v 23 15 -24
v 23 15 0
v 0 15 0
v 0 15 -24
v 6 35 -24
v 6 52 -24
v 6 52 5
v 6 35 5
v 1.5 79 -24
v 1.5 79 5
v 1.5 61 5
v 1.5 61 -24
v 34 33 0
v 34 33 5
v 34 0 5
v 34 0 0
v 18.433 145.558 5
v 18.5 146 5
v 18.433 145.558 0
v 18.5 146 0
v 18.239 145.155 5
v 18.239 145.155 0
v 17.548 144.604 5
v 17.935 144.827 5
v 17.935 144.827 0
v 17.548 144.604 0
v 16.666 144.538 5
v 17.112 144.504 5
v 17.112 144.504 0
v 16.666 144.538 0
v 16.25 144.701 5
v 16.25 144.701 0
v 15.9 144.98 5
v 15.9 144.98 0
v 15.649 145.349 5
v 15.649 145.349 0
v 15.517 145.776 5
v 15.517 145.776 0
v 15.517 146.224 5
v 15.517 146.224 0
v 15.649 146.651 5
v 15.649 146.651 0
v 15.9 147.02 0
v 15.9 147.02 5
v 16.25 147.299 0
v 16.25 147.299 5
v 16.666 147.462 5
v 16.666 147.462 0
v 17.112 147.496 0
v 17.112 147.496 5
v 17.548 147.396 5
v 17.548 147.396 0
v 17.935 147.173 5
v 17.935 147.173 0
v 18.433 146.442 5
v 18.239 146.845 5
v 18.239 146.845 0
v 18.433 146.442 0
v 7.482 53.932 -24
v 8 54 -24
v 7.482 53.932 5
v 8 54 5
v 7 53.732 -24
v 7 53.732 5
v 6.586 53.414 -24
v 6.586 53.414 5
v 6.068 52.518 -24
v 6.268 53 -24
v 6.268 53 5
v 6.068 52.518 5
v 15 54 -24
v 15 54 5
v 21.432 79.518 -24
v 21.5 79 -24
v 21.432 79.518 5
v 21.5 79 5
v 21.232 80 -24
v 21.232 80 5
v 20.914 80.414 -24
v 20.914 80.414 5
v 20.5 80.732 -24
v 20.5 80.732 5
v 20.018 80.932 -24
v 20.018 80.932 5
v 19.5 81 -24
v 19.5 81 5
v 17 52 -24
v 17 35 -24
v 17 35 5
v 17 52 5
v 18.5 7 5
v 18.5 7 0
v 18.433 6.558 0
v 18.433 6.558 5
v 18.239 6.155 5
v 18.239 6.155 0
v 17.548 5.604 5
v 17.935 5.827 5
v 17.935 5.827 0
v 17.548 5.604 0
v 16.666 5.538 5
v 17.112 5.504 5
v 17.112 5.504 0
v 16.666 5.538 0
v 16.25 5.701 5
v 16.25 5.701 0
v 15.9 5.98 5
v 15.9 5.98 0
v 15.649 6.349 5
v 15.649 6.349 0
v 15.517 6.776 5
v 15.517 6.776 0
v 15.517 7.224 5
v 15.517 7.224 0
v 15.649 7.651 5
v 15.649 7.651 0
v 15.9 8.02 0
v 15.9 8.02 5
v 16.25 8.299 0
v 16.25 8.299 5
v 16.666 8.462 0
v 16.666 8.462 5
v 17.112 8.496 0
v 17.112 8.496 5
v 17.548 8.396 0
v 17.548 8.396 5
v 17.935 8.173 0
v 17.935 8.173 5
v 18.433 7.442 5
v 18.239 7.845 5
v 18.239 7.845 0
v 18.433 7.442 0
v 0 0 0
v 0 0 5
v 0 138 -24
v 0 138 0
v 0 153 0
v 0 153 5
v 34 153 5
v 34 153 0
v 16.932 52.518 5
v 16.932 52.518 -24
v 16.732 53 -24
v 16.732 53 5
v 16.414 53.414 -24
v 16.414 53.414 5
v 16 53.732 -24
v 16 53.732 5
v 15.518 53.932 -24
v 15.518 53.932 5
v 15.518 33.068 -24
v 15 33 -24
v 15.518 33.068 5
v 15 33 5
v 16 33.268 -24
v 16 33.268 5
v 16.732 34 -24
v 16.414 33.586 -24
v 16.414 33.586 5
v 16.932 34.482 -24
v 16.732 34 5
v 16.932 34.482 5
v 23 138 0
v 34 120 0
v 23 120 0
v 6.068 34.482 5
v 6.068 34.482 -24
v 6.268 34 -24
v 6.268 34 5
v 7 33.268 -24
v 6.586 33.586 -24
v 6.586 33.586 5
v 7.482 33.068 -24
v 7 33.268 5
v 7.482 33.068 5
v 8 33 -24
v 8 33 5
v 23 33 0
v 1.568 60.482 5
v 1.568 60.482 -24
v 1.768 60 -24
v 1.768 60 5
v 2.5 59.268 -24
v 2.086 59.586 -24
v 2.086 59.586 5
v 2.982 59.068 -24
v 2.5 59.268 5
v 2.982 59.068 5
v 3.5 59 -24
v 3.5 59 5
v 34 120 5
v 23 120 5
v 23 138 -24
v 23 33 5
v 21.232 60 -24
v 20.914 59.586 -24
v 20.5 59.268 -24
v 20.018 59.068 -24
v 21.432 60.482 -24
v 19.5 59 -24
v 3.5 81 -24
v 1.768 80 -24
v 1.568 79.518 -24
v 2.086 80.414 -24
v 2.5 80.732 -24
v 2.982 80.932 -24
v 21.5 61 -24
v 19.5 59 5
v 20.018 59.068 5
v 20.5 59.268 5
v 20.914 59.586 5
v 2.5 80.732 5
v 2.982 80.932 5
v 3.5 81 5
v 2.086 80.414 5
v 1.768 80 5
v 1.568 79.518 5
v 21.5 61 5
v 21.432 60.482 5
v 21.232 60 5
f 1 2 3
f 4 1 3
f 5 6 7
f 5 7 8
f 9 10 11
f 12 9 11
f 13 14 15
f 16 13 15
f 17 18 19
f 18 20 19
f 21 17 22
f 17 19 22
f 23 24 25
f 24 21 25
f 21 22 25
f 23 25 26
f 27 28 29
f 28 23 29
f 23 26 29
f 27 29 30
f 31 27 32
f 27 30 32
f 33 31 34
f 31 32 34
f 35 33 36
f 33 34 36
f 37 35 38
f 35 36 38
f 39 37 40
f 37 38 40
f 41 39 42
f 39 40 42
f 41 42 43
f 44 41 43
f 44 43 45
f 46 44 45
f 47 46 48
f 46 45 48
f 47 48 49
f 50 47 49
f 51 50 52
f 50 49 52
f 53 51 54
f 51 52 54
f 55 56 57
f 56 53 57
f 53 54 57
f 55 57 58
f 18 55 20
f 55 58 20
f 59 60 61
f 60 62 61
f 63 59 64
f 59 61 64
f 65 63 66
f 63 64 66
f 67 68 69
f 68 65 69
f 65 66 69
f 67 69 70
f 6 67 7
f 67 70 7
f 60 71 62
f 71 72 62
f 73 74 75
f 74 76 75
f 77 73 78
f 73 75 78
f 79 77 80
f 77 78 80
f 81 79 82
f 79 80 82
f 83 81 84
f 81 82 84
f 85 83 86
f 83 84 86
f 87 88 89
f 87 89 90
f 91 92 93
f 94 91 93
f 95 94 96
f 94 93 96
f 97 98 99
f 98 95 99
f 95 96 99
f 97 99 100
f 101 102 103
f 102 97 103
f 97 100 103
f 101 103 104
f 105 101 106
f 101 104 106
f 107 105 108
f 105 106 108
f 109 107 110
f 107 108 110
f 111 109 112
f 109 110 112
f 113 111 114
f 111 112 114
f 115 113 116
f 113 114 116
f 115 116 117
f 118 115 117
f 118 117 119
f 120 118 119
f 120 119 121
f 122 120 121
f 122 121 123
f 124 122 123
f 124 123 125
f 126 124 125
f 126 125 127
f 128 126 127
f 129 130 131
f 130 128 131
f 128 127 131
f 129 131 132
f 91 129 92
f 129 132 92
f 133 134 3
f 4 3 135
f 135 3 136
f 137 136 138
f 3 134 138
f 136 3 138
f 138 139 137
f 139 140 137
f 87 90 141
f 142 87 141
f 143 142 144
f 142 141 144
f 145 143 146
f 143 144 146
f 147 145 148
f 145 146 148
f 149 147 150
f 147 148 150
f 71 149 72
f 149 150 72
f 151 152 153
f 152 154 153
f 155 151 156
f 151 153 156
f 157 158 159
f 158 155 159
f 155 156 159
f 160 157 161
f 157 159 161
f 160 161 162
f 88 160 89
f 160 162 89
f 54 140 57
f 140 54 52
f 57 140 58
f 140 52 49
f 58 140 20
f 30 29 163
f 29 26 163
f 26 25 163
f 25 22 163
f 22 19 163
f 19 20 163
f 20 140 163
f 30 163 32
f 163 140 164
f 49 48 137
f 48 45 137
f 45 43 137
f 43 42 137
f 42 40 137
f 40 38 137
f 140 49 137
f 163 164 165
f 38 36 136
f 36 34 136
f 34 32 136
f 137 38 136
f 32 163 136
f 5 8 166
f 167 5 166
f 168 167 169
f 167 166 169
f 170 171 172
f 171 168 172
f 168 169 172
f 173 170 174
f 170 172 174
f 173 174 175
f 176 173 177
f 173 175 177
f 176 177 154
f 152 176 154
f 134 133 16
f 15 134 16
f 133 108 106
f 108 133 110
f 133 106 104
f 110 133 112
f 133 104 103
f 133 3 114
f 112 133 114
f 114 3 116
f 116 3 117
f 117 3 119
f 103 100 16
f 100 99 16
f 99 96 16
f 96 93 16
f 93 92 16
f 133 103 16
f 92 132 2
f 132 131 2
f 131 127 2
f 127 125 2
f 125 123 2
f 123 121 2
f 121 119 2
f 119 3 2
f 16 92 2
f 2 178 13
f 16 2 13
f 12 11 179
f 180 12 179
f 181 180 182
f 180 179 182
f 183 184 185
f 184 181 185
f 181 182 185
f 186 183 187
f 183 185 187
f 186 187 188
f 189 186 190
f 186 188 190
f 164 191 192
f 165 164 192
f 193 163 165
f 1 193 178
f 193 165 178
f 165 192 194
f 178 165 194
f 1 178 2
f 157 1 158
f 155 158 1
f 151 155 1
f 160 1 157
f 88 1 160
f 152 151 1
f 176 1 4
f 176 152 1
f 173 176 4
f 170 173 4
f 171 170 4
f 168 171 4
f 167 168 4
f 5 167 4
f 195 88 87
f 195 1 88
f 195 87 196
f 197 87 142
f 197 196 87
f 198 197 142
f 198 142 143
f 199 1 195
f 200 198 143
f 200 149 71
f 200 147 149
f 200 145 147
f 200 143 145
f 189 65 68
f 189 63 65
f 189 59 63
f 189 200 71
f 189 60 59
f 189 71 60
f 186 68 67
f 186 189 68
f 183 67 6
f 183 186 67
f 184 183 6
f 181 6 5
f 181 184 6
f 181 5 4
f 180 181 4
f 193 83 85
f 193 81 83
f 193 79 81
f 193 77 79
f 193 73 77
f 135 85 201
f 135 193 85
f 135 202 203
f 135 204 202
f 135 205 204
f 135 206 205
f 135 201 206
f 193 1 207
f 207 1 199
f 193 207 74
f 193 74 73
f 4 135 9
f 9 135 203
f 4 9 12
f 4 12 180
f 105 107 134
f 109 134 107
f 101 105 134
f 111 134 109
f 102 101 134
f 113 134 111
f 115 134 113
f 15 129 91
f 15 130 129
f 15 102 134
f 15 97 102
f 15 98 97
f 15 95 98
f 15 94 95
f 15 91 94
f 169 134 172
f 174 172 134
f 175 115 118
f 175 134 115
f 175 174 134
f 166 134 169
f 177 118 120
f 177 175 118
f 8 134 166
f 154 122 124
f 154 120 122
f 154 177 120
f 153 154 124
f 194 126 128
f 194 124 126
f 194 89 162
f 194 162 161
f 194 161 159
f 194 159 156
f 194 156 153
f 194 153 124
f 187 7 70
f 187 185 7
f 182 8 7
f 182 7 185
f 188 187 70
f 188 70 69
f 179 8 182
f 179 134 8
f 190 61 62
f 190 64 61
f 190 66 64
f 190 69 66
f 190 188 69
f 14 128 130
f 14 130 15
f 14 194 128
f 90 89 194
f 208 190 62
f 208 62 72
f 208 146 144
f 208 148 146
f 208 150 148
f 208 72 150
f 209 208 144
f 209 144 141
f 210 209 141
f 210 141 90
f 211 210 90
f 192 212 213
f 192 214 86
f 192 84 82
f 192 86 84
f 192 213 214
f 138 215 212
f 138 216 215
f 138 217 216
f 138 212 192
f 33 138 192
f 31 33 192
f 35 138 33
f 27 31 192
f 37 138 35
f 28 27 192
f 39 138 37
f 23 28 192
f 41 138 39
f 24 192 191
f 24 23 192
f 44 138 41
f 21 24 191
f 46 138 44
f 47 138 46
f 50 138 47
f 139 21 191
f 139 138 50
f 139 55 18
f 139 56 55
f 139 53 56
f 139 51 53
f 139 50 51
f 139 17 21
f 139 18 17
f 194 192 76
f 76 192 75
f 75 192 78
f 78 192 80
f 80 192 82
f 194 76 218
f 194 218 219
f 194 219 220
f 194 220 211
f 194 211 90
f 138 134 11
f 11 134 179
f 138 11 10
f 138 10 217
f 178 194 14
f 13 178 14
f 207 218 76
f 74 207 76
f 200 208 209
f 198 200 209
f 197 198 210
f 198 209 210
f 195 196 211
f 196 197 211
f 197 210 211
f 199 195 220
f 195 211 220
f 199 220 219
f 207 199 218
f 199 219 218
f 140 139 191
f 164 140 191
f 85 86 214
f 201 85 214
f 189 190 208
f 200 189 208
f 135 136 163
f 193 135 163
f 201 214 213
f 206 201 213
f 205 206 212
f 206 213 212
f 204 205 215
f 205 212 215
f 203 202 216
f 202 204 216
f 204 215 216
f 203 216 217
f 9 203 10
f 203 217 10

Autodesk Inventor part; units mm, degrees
ref_plane "YZ Plane" through (0, 0, 0) normal (1, 0, 0) x (0, 1, 0)
ref_plane "XZ Plane" through (0, 0, 0) normal (0, 1, 0) x (-1, 0, 0)
ref_plane "XY Plane" through (0, 0, 0) normal (0, 0, 1) x (1, 0, 0)
sketch "Sketch1" plane through (0, 0, 0) normal (0, 0, 1) x (1, 0, 0)
  line L0 (0, 0) -> (34, 0)
  line L1 (34, 0) -> (34, 153)
  line L2 (34, 153) -> (0, 153)
  line L3 (0, 153) -> (0, 0)
  circle A0 centre (17, 7) radius 1.5
  circle A1 centre (17, 146) radius 1.5
  point P0 (17, 153)
  point P1 (17, 0)
  dimension "d0" = 34
  dimension "d1" = 153
  dimension "d2" = 3
  dimension "d4" = 7
  dimension "d5" = 3
  dimension "d6" = 7
extrude "Extrusion1" add sketch "Sketch1" along normal blind 5
sketch "Sketch2" plane through (0, 0, 0) normal (0, 0, -1) x (-1, 0, 0)
  line L0 (0, 153) -> (0, 0) projected
  line L1 (0, 138) -> (-34, 138)
  line L2 (-34, 138) -> (-34, 15)
  line L3 (-34, 15) -> (0, 15)
  line L4 (0, 15) -> (0, 138)
  line L5 (-34, 0) -> (-34, 153) projected
  point P0 (0, 76.5)
  dimension "d10" = 123
extrude "Extrusion2" add sketch "Sketch2" along normal blind 5
sketch "Sketch3" plane through (0, 0, 5) normal (0, 0, 1) x (1, 0, 0)
  line L0 (23, 33) -> (34, 33)
  line L1 (34, 33) -> (34, 120)
  line L2 (34, 120) -> (23, 120)
  line L3 (23, 120) -> (23, 33)
  line L4 (34, 0) -> (34, 153) construction
  line L5 (0, 15) -> (34, 15) construction
  line L6 (34, 138) -> (0, 138) construction
  line L7 (28.5, 33) -> (28.5, 15) construction
  line L8 (28.5, 120) -> (28.5, 138) construction
  dimension "d29" = 11
  dimension "d30" = 87
extrude "Extrusion3" cut sketch "Sketch3" against normal through all
sketch "Sketch4" plane through (0, 0, 5) normal (0, 0, 1) x (1, 0, 0)
  line L0 (17, 33) -> (6, 33)
  line L1 (6, 33) -> (6, 54)
  line L2 (6, 54) -> (17, 54)
  line L3 (17, 54) -> (17, 33)
  line L4 (23, 33) -> (23, 120)
  line L5 (0, 153) -> (0, 0)
  line L6 (6, 43.5) -> (0, 43.5)
  line L7 (17, 43.5) -> (23, 43.5)
  dimension "d17" = 11
  dimension "d18" = 21
extrude "Extrusion4" cut sketch "Sketch4" against normal through all
fillet "Fillet1" radius 2 4 edges at (6, 54, 0) (17, 54, 0) (17, 33, 0) (6, 33, 0)
sketch "Sketch6" plane through (0, 0, 5) normal (0, 0, 1) x (1, 0, 0)
  line L0 (21.5, 59) -> (1.5, 59)
  line L1 (1.5, 59) -> (1.5, 81)
  line L2 (1.5, 81) -> (21.5, 81)
  line L3 (21.5, 81) -> (21.5, 59)
  line L4 (17, 34) -> (17, 17) construction
  line L5 (8, 54) -> (15, 54) construction
  line L6 (1.5, 70) -> (0, 70) construction
  line L7 (0, 153) -> (0, 0) construction
  line L8 (21.5, 70) -> (23, 70) construction
  line L9 (23, 33) -> (23, 120)
  dimension "d23" = 20
  dimension "d24" = 22
  dimension "d25" = 5
extrude "Extrusion5" cut sketch "Sketch6" against normal through all
fillet "Fillet2" radius 2 4 edges at (21.5, 81, 0) (1.5, 81, 0) (1.5, 59, 0) (21.5, 59, 0)
sketch "Sketch7" plane through (0, 0, -5) normal (0, 0, -1) x (-1, 0, 0)
  line L0 (-21.5, 61) -> (-21.5, 79) projected
  arc A0 (-19.5, 81) -> (-21.5, 79) centre (-19.5, 79) ccw projected
  line L1 (-19.5, 81) -> (-3.5, 81) projected
  arc A1 (-1.5, 79) -> (-3.5, 81) centre (-3.5, 79) ccw projected
  line L2 (-1.5, 79) -> (-1.5, 61) projected
  arc A2 (-3.5, 59) -> (-1.5, 61) centre (-3.5, 61) ccw projected
  line L3 (-3.5, 59) -> (-19.5, 59) projected
  arc A3 (-21.5, 61) -> (-19.5, 59) centre (-19.5, 61) ccw projected
  line L4 (-17, 35) -> (-17, 52) projected
  arc A4 (-15, 54) -> (-17, 52) centre (-15, 52) ccw projected
  line L5 (-15, 54) -> (-8, 54) projected
  arc A5 (-6, 52) -> (-8, 54) centre (-8, 52) ccw projected
  line L6 (-6, 52) -> (-6, 35) projected
  arc A6 (-8, 33) -> (-6, 35) centre (-8, 35) ccw projected
  line L7 (-8, 33) -> (-15, 33) projected
  arc A7 (-17, 35) -> (-15, 33) centre (-15, 35) ccw projected
  line L8 (-23, 33) -> (-34, 33) projected
  line L9 (-34, 33) -> (-34, 15) projected
  line L10 (-34, 15) -> (0, 15) projected
  line L11 (0, 15) -> (0, 138) projected
  line L12 (0, 138) -> (-34, 138) projected
  line L13 (-34, 138) -> (-34, 120) projected
  line L14 (-34, 120) -> (-23, 120) projected
  line L15 (-23, 120) -> (-23, 33) projected
  point P0 (0, 0)
extrude "Extrusion6" add sketch "Sketch7" along normal blind 19
sketch "Sketch8" plane through (23, 33, 5) normal (0, 1, 0) x (1, 0, 0)
  line L0 (0, 0) -> (0, 29) projected
  line L1 (11, 0) -> (0, 0) projected
  line L2 (11, 29) -> (11, 0) projected
  line L3 (0, 29) -> (11, 29) projected
  line L4 (-23, 5) -> (11, 5) projected
  line L5 (0, 5) -> (11, 5)
extrude "Extrusion7" cut sketch "Sketch8" against normal through all contours L0 L3 L2 L4
sketch "Sketch9" plane through (23, 120, 5) normal (0, -1, 0) x (1, 0, 0)
  line L0 (11, -5) -> (-23, -5) projected
  line L1 (11, -5) -> (11, -29) projected
  line L2 (-23, -29) -> (11, -29) projected
  line L3 (-23, -5) -> (-23, -29) projected
  line L4 (0, 0) -> (0, -29) projected
  line L5 (0, 0) -> (0, -5) projected
  line L6 (0, -29) -> (0, -5) projected
  line L7 (-23, -29) -> (11, -29) projected
  line L8 (11, -29) -> (0, -29)
  line L9 (0, -29) -> (0, -5)
  line L10 (0, -5) -> (11, -5)
  line L11 (11, -5) -> (11, -29)
  point P0 (-23, -5)
extrude "Extrusion8" cut sketch "Sketch9" against normal through all contours L1 L2 L4 L0
properties part number "BP005" material "ABS Plastic"
